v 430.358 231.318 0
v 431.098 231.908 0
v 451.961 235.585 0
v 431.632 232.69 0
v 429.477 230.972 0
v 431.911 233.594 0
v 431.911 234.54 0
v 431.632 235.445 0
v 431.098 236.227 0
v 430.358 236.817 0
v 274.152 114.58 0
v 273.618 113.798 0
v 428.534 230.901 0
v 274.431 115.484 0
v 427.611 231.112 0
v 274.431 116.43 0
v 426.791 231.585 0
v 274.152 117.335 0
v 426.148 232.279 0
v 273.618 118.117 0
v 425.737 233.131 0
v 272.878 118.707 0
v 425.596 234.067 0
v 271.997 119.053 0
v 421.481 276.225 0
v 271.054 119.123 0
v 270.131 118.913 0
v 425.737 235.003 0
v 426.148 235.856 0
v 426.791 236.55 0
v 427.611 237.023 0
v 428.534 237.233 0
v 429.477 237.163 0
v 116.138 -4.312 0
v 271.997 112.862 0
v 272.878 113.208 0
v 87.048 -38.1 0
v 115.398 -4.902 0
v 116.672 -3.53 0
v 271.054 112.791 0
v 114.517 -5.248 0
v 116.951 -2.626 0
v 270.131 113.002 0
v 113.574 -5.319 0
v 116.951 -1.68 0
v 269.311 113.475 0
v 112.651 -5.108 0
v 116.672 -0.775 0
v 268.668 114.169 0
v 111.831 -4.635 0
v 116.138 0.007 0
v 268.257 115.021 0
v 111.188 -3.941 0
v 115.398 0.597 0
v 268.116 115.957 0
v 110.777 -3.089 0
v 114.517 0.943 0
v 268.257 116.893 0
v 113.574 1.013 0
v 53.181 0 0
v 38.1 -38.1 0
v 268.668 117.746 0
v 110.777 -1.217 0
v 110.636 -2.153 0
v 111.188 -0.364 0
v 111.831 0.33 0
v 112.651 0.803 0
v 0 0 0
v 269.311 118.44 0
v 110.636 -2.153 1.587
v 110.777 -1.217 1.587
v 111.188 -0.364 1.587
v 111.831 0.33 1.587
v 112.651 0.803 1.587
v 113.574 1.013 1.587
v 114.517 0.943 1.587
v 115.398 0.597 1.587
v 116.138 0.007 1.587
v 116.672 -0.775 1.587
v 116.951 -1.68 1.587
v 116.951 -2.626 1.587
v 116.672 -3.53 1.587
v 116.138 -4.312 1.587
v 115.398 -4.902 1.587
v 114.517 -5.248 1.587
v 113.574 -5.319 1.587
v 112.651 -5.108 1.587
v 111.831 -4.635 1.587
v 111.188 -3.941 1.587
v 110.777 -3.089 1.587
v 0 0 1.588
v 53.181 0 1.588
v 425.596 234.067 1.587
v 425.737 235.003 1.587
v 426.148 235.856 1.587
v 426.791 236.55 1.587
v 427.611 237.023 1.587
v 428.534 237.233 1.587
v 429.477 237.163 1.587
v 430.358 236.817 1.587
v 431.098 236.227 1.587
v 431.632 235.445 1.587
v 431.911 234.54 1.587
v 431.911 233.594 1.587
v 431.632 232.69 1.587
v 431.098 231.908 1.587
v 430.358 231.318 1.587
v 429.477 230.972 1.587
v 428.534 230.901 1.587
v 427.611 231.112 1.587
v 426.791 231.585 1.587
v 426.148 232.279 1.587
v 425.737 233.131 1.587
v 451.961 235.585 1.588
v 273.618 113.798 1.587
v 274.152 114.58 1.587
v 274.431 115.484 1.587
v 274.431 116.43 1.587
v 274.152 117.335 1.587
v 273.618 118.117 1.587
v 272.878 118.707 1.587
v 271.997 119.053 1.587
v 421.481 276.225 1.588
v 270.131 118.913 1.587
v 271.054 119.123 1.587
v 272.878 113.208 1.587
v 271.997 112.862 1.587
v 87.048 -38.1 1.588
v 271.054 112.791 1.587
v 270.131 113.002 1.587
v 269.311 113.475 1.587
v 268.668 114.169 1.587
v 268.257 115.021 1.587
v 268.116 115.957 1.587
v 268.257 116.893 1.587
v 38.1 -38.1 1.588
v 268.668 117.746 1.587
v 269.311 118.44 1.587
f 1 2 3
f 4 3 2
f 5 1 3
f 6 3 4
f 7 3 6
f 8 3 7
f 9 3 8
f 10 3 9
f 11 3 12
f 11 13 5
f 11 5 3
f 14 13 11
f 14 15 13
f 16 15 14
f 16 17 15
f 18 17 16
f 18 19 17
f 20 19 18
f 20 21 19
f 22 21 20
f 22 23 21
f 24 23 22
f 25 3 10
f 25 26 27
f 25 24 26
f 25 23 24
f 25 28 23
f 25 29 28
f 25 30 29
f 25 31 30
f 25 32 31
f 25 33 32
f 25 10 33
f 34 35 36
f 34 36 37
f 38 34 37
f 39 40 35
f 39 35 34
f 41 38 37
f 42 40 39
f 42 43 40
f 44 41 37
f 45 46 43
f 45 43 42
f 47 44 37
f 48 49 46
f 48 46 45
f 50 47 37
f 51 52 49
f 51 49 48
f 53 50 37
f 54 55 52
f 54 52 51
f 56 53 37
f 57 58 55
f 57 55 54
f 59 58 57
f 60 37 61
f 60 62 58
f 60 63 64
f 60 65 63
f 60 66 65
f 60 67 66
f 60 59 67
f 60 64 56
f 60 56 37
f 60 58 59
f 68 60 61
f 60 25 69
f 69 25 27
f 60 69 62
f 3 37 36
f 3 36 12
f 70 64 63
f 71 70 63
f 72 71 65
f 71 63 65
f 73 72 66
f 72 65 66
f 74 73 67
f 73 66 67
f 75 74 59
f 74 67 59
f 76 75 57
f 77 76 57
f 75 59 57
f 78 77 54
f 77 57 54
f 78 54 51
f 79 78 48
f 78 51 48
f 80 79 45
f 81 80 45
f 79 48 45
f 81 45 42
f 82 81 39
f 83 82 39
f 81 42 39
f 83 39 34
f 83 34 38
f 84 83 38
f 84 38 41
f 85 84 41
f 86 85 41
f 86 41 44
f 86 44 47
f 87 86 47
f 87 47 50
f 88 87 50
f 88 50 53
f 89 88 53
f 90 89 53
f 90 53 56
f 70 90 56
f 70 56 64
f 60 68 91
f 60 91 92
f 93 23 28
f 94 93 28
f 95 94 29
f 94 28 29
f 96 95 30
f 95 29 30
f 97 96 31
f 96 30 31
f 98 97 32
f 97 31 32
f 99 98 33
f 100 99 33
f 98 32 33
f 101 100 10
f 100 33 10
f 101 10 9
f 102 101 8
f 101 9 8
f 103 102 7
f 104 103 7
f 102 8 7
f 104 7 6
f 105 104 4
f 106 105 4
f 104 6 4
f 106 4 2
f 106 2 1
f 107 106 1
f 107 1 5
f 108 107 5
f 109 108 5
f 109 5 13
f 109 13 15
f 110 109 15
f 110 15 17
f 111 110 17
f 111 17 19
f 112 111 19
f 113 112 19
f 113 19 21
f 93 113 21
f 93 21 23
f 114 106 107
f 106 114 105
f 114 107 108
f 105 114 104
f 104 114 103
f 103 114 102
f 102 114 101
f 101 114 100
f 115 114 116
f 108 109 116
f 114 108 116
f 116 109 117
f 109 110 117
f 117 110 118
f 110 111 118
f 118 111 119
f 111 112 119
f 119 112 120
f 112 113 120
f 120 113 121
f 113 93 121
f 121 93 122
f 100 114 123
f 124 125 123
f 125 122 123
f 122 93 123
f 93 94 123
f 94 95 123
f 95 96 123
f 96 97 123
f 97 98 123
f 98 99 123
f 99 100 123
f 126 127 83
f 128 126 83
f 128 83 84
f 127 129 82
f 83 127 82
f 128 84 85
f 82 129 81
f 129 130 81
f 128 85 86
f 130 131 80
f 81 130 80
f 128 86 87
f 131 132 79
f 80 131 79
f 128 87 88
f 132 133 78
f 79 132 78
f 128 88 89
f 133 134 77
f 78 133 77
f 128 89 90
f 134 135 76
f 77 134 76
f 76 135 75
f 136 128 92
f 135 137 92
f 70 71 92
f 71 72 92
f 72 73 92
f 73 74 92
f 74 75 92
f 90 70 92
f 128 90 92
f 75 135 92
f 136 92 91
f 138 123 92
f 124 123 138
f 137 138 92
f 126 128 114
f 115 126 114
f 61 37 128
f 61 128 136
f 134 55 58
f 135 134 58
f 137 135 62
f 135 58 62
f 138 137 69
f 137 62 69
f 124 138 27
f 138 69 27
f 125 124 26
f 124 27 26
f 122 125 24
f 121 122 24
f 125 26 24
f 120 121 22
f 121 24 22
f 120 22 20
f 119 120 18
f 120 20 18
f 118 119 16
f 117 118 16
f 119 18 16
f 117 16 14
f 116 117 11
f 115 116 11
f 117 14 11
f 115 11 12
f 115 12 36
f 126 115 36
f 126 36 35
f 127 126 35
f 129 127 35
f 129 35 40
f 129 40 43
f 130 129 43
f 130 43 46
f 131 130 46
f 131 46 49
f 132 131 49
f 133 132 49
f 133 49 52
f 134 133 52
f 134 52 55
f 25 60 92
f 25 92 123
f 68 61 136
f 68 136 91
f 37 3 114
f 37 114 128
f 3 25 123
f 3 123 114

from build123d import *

# Parameters (mm, degrees)
BOSS_EXTRUDE1_DEPTH         = 1.5875
F_1_4_0_25_DIAMETER_HOLE1_D = 6.35


with BuildPart() as part:
    # Sketch1 → Boss-Extrude1 (new body)
    with BuildSketch(Plane.XY):
        Polygon((0, 0), (53.18125, 0), (421.48125, 276.225), (451.96125, 235.585), (87.047916667, -38.1), (38.1, -38.1), align=None)
    extrude(amount=BOSS_EXTRUDE1_DEPTH)

    # 1/4 (0.25) Diameter Hole1 (through all)
    with Locations(Plane.XY.offset(1.5875)):
        with Locations((428.77096872, 234.06728904), (271.29096872, 115.95728904), (113.81096872, -2.15271096)):
            Hole(F_1_4_0_25_DIAMETER_HOLE1_D / 2)


solid = part.part
